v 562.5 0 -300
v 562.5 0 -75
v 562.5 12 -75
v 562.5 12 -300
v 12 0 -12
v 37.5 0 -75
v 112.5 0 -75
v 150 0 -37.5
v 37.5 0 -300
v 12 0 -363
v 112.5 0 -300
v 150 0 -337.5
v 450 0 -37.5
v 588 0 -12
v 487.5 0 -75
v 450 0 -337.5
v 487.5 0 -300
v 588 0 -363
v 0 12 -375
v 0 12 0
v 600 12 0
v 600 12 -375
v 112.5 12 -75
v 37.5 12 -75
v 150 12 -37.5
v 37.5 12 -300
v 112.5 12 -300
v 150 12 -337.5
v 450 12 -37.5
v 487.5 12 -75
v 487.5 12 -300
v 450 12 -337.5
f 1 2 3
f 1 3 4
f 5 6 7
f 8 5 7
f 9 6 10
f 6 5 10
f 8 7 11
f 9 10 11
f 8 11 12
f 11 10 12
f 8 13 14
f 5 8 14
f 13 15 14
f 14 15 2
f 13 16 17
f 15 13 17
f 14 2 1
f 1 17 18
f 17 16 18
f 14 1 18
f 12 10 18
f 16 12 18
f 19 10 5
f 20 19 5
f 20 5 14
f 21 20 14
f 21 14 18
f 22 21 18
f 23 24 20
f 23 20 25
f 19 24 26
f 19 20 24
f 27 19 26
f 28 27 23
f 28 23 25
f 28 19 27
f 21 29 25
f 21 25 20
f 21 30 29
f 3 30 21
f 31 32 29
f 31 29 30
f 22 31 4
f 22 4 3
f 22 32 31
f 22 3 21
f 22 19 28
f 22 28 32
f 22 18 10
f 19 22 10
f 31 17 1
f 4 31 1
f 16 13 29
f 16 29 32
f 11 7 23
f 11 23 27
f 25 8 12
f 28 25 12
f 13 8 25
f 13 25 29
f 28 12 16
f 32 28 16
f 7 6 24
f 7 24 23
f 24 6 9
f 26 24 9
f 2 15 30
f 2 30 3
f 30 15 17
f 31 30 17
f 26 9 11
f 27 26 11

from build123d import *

# Parameters (mm, degrees)
SKETCH1_W           = 75
SKETCH1_H           = 225
SKETCH1_W_2         = 300
SKETCH1_H_2         = 300
BOSS_EXTRUDE1_DEPTH = 12
CHAMFER1_SIZE       = 12


with BuildPart() as part:
    # Sketch1 → Boss-Extrude1 (new body)
    with BuildSketch(Plane(origin=(0, 0, 0), x_dir=(1, 0, 0), z_dir=(0, 1, 0))):
        Polygon((0, 375), (0, 0), (600, 0), (600, 375), (375, 375), (225, 375), align=None)
        with Locations((75, 187.5)):
            Rectangle(SKETCH1_W, SKETCH1_H, mode=Mode.SUBTRACT)
        with Locations((300, 187.5)):
            Rectangle(SKETCH1_W_2, SKETCH1_H_2, mode=Mode.SUBTRACT)
        with Locations((525, 187.5)):
            Rectangle(SKETCH1_W, SKETCH1_H, mode=Mode.SUBTRACT)
    extrude(amount=BOSS_EXTRUDE1_DEPTH)

    # Chamfer1
    chamfer1_edges = [part.edges().sort_by_distance(p)[0] for p in [
        (300, 0, -375),
        (0, 0, -187.5),
        (300, 0, 0),
        (600, 0, -187.5),
    ]]
    chamfer(chamfer1_edges, length=CHAMFER1_SIZE - 0.0001)  # a hair under: the kernel refuses the full size


solid = part.part
